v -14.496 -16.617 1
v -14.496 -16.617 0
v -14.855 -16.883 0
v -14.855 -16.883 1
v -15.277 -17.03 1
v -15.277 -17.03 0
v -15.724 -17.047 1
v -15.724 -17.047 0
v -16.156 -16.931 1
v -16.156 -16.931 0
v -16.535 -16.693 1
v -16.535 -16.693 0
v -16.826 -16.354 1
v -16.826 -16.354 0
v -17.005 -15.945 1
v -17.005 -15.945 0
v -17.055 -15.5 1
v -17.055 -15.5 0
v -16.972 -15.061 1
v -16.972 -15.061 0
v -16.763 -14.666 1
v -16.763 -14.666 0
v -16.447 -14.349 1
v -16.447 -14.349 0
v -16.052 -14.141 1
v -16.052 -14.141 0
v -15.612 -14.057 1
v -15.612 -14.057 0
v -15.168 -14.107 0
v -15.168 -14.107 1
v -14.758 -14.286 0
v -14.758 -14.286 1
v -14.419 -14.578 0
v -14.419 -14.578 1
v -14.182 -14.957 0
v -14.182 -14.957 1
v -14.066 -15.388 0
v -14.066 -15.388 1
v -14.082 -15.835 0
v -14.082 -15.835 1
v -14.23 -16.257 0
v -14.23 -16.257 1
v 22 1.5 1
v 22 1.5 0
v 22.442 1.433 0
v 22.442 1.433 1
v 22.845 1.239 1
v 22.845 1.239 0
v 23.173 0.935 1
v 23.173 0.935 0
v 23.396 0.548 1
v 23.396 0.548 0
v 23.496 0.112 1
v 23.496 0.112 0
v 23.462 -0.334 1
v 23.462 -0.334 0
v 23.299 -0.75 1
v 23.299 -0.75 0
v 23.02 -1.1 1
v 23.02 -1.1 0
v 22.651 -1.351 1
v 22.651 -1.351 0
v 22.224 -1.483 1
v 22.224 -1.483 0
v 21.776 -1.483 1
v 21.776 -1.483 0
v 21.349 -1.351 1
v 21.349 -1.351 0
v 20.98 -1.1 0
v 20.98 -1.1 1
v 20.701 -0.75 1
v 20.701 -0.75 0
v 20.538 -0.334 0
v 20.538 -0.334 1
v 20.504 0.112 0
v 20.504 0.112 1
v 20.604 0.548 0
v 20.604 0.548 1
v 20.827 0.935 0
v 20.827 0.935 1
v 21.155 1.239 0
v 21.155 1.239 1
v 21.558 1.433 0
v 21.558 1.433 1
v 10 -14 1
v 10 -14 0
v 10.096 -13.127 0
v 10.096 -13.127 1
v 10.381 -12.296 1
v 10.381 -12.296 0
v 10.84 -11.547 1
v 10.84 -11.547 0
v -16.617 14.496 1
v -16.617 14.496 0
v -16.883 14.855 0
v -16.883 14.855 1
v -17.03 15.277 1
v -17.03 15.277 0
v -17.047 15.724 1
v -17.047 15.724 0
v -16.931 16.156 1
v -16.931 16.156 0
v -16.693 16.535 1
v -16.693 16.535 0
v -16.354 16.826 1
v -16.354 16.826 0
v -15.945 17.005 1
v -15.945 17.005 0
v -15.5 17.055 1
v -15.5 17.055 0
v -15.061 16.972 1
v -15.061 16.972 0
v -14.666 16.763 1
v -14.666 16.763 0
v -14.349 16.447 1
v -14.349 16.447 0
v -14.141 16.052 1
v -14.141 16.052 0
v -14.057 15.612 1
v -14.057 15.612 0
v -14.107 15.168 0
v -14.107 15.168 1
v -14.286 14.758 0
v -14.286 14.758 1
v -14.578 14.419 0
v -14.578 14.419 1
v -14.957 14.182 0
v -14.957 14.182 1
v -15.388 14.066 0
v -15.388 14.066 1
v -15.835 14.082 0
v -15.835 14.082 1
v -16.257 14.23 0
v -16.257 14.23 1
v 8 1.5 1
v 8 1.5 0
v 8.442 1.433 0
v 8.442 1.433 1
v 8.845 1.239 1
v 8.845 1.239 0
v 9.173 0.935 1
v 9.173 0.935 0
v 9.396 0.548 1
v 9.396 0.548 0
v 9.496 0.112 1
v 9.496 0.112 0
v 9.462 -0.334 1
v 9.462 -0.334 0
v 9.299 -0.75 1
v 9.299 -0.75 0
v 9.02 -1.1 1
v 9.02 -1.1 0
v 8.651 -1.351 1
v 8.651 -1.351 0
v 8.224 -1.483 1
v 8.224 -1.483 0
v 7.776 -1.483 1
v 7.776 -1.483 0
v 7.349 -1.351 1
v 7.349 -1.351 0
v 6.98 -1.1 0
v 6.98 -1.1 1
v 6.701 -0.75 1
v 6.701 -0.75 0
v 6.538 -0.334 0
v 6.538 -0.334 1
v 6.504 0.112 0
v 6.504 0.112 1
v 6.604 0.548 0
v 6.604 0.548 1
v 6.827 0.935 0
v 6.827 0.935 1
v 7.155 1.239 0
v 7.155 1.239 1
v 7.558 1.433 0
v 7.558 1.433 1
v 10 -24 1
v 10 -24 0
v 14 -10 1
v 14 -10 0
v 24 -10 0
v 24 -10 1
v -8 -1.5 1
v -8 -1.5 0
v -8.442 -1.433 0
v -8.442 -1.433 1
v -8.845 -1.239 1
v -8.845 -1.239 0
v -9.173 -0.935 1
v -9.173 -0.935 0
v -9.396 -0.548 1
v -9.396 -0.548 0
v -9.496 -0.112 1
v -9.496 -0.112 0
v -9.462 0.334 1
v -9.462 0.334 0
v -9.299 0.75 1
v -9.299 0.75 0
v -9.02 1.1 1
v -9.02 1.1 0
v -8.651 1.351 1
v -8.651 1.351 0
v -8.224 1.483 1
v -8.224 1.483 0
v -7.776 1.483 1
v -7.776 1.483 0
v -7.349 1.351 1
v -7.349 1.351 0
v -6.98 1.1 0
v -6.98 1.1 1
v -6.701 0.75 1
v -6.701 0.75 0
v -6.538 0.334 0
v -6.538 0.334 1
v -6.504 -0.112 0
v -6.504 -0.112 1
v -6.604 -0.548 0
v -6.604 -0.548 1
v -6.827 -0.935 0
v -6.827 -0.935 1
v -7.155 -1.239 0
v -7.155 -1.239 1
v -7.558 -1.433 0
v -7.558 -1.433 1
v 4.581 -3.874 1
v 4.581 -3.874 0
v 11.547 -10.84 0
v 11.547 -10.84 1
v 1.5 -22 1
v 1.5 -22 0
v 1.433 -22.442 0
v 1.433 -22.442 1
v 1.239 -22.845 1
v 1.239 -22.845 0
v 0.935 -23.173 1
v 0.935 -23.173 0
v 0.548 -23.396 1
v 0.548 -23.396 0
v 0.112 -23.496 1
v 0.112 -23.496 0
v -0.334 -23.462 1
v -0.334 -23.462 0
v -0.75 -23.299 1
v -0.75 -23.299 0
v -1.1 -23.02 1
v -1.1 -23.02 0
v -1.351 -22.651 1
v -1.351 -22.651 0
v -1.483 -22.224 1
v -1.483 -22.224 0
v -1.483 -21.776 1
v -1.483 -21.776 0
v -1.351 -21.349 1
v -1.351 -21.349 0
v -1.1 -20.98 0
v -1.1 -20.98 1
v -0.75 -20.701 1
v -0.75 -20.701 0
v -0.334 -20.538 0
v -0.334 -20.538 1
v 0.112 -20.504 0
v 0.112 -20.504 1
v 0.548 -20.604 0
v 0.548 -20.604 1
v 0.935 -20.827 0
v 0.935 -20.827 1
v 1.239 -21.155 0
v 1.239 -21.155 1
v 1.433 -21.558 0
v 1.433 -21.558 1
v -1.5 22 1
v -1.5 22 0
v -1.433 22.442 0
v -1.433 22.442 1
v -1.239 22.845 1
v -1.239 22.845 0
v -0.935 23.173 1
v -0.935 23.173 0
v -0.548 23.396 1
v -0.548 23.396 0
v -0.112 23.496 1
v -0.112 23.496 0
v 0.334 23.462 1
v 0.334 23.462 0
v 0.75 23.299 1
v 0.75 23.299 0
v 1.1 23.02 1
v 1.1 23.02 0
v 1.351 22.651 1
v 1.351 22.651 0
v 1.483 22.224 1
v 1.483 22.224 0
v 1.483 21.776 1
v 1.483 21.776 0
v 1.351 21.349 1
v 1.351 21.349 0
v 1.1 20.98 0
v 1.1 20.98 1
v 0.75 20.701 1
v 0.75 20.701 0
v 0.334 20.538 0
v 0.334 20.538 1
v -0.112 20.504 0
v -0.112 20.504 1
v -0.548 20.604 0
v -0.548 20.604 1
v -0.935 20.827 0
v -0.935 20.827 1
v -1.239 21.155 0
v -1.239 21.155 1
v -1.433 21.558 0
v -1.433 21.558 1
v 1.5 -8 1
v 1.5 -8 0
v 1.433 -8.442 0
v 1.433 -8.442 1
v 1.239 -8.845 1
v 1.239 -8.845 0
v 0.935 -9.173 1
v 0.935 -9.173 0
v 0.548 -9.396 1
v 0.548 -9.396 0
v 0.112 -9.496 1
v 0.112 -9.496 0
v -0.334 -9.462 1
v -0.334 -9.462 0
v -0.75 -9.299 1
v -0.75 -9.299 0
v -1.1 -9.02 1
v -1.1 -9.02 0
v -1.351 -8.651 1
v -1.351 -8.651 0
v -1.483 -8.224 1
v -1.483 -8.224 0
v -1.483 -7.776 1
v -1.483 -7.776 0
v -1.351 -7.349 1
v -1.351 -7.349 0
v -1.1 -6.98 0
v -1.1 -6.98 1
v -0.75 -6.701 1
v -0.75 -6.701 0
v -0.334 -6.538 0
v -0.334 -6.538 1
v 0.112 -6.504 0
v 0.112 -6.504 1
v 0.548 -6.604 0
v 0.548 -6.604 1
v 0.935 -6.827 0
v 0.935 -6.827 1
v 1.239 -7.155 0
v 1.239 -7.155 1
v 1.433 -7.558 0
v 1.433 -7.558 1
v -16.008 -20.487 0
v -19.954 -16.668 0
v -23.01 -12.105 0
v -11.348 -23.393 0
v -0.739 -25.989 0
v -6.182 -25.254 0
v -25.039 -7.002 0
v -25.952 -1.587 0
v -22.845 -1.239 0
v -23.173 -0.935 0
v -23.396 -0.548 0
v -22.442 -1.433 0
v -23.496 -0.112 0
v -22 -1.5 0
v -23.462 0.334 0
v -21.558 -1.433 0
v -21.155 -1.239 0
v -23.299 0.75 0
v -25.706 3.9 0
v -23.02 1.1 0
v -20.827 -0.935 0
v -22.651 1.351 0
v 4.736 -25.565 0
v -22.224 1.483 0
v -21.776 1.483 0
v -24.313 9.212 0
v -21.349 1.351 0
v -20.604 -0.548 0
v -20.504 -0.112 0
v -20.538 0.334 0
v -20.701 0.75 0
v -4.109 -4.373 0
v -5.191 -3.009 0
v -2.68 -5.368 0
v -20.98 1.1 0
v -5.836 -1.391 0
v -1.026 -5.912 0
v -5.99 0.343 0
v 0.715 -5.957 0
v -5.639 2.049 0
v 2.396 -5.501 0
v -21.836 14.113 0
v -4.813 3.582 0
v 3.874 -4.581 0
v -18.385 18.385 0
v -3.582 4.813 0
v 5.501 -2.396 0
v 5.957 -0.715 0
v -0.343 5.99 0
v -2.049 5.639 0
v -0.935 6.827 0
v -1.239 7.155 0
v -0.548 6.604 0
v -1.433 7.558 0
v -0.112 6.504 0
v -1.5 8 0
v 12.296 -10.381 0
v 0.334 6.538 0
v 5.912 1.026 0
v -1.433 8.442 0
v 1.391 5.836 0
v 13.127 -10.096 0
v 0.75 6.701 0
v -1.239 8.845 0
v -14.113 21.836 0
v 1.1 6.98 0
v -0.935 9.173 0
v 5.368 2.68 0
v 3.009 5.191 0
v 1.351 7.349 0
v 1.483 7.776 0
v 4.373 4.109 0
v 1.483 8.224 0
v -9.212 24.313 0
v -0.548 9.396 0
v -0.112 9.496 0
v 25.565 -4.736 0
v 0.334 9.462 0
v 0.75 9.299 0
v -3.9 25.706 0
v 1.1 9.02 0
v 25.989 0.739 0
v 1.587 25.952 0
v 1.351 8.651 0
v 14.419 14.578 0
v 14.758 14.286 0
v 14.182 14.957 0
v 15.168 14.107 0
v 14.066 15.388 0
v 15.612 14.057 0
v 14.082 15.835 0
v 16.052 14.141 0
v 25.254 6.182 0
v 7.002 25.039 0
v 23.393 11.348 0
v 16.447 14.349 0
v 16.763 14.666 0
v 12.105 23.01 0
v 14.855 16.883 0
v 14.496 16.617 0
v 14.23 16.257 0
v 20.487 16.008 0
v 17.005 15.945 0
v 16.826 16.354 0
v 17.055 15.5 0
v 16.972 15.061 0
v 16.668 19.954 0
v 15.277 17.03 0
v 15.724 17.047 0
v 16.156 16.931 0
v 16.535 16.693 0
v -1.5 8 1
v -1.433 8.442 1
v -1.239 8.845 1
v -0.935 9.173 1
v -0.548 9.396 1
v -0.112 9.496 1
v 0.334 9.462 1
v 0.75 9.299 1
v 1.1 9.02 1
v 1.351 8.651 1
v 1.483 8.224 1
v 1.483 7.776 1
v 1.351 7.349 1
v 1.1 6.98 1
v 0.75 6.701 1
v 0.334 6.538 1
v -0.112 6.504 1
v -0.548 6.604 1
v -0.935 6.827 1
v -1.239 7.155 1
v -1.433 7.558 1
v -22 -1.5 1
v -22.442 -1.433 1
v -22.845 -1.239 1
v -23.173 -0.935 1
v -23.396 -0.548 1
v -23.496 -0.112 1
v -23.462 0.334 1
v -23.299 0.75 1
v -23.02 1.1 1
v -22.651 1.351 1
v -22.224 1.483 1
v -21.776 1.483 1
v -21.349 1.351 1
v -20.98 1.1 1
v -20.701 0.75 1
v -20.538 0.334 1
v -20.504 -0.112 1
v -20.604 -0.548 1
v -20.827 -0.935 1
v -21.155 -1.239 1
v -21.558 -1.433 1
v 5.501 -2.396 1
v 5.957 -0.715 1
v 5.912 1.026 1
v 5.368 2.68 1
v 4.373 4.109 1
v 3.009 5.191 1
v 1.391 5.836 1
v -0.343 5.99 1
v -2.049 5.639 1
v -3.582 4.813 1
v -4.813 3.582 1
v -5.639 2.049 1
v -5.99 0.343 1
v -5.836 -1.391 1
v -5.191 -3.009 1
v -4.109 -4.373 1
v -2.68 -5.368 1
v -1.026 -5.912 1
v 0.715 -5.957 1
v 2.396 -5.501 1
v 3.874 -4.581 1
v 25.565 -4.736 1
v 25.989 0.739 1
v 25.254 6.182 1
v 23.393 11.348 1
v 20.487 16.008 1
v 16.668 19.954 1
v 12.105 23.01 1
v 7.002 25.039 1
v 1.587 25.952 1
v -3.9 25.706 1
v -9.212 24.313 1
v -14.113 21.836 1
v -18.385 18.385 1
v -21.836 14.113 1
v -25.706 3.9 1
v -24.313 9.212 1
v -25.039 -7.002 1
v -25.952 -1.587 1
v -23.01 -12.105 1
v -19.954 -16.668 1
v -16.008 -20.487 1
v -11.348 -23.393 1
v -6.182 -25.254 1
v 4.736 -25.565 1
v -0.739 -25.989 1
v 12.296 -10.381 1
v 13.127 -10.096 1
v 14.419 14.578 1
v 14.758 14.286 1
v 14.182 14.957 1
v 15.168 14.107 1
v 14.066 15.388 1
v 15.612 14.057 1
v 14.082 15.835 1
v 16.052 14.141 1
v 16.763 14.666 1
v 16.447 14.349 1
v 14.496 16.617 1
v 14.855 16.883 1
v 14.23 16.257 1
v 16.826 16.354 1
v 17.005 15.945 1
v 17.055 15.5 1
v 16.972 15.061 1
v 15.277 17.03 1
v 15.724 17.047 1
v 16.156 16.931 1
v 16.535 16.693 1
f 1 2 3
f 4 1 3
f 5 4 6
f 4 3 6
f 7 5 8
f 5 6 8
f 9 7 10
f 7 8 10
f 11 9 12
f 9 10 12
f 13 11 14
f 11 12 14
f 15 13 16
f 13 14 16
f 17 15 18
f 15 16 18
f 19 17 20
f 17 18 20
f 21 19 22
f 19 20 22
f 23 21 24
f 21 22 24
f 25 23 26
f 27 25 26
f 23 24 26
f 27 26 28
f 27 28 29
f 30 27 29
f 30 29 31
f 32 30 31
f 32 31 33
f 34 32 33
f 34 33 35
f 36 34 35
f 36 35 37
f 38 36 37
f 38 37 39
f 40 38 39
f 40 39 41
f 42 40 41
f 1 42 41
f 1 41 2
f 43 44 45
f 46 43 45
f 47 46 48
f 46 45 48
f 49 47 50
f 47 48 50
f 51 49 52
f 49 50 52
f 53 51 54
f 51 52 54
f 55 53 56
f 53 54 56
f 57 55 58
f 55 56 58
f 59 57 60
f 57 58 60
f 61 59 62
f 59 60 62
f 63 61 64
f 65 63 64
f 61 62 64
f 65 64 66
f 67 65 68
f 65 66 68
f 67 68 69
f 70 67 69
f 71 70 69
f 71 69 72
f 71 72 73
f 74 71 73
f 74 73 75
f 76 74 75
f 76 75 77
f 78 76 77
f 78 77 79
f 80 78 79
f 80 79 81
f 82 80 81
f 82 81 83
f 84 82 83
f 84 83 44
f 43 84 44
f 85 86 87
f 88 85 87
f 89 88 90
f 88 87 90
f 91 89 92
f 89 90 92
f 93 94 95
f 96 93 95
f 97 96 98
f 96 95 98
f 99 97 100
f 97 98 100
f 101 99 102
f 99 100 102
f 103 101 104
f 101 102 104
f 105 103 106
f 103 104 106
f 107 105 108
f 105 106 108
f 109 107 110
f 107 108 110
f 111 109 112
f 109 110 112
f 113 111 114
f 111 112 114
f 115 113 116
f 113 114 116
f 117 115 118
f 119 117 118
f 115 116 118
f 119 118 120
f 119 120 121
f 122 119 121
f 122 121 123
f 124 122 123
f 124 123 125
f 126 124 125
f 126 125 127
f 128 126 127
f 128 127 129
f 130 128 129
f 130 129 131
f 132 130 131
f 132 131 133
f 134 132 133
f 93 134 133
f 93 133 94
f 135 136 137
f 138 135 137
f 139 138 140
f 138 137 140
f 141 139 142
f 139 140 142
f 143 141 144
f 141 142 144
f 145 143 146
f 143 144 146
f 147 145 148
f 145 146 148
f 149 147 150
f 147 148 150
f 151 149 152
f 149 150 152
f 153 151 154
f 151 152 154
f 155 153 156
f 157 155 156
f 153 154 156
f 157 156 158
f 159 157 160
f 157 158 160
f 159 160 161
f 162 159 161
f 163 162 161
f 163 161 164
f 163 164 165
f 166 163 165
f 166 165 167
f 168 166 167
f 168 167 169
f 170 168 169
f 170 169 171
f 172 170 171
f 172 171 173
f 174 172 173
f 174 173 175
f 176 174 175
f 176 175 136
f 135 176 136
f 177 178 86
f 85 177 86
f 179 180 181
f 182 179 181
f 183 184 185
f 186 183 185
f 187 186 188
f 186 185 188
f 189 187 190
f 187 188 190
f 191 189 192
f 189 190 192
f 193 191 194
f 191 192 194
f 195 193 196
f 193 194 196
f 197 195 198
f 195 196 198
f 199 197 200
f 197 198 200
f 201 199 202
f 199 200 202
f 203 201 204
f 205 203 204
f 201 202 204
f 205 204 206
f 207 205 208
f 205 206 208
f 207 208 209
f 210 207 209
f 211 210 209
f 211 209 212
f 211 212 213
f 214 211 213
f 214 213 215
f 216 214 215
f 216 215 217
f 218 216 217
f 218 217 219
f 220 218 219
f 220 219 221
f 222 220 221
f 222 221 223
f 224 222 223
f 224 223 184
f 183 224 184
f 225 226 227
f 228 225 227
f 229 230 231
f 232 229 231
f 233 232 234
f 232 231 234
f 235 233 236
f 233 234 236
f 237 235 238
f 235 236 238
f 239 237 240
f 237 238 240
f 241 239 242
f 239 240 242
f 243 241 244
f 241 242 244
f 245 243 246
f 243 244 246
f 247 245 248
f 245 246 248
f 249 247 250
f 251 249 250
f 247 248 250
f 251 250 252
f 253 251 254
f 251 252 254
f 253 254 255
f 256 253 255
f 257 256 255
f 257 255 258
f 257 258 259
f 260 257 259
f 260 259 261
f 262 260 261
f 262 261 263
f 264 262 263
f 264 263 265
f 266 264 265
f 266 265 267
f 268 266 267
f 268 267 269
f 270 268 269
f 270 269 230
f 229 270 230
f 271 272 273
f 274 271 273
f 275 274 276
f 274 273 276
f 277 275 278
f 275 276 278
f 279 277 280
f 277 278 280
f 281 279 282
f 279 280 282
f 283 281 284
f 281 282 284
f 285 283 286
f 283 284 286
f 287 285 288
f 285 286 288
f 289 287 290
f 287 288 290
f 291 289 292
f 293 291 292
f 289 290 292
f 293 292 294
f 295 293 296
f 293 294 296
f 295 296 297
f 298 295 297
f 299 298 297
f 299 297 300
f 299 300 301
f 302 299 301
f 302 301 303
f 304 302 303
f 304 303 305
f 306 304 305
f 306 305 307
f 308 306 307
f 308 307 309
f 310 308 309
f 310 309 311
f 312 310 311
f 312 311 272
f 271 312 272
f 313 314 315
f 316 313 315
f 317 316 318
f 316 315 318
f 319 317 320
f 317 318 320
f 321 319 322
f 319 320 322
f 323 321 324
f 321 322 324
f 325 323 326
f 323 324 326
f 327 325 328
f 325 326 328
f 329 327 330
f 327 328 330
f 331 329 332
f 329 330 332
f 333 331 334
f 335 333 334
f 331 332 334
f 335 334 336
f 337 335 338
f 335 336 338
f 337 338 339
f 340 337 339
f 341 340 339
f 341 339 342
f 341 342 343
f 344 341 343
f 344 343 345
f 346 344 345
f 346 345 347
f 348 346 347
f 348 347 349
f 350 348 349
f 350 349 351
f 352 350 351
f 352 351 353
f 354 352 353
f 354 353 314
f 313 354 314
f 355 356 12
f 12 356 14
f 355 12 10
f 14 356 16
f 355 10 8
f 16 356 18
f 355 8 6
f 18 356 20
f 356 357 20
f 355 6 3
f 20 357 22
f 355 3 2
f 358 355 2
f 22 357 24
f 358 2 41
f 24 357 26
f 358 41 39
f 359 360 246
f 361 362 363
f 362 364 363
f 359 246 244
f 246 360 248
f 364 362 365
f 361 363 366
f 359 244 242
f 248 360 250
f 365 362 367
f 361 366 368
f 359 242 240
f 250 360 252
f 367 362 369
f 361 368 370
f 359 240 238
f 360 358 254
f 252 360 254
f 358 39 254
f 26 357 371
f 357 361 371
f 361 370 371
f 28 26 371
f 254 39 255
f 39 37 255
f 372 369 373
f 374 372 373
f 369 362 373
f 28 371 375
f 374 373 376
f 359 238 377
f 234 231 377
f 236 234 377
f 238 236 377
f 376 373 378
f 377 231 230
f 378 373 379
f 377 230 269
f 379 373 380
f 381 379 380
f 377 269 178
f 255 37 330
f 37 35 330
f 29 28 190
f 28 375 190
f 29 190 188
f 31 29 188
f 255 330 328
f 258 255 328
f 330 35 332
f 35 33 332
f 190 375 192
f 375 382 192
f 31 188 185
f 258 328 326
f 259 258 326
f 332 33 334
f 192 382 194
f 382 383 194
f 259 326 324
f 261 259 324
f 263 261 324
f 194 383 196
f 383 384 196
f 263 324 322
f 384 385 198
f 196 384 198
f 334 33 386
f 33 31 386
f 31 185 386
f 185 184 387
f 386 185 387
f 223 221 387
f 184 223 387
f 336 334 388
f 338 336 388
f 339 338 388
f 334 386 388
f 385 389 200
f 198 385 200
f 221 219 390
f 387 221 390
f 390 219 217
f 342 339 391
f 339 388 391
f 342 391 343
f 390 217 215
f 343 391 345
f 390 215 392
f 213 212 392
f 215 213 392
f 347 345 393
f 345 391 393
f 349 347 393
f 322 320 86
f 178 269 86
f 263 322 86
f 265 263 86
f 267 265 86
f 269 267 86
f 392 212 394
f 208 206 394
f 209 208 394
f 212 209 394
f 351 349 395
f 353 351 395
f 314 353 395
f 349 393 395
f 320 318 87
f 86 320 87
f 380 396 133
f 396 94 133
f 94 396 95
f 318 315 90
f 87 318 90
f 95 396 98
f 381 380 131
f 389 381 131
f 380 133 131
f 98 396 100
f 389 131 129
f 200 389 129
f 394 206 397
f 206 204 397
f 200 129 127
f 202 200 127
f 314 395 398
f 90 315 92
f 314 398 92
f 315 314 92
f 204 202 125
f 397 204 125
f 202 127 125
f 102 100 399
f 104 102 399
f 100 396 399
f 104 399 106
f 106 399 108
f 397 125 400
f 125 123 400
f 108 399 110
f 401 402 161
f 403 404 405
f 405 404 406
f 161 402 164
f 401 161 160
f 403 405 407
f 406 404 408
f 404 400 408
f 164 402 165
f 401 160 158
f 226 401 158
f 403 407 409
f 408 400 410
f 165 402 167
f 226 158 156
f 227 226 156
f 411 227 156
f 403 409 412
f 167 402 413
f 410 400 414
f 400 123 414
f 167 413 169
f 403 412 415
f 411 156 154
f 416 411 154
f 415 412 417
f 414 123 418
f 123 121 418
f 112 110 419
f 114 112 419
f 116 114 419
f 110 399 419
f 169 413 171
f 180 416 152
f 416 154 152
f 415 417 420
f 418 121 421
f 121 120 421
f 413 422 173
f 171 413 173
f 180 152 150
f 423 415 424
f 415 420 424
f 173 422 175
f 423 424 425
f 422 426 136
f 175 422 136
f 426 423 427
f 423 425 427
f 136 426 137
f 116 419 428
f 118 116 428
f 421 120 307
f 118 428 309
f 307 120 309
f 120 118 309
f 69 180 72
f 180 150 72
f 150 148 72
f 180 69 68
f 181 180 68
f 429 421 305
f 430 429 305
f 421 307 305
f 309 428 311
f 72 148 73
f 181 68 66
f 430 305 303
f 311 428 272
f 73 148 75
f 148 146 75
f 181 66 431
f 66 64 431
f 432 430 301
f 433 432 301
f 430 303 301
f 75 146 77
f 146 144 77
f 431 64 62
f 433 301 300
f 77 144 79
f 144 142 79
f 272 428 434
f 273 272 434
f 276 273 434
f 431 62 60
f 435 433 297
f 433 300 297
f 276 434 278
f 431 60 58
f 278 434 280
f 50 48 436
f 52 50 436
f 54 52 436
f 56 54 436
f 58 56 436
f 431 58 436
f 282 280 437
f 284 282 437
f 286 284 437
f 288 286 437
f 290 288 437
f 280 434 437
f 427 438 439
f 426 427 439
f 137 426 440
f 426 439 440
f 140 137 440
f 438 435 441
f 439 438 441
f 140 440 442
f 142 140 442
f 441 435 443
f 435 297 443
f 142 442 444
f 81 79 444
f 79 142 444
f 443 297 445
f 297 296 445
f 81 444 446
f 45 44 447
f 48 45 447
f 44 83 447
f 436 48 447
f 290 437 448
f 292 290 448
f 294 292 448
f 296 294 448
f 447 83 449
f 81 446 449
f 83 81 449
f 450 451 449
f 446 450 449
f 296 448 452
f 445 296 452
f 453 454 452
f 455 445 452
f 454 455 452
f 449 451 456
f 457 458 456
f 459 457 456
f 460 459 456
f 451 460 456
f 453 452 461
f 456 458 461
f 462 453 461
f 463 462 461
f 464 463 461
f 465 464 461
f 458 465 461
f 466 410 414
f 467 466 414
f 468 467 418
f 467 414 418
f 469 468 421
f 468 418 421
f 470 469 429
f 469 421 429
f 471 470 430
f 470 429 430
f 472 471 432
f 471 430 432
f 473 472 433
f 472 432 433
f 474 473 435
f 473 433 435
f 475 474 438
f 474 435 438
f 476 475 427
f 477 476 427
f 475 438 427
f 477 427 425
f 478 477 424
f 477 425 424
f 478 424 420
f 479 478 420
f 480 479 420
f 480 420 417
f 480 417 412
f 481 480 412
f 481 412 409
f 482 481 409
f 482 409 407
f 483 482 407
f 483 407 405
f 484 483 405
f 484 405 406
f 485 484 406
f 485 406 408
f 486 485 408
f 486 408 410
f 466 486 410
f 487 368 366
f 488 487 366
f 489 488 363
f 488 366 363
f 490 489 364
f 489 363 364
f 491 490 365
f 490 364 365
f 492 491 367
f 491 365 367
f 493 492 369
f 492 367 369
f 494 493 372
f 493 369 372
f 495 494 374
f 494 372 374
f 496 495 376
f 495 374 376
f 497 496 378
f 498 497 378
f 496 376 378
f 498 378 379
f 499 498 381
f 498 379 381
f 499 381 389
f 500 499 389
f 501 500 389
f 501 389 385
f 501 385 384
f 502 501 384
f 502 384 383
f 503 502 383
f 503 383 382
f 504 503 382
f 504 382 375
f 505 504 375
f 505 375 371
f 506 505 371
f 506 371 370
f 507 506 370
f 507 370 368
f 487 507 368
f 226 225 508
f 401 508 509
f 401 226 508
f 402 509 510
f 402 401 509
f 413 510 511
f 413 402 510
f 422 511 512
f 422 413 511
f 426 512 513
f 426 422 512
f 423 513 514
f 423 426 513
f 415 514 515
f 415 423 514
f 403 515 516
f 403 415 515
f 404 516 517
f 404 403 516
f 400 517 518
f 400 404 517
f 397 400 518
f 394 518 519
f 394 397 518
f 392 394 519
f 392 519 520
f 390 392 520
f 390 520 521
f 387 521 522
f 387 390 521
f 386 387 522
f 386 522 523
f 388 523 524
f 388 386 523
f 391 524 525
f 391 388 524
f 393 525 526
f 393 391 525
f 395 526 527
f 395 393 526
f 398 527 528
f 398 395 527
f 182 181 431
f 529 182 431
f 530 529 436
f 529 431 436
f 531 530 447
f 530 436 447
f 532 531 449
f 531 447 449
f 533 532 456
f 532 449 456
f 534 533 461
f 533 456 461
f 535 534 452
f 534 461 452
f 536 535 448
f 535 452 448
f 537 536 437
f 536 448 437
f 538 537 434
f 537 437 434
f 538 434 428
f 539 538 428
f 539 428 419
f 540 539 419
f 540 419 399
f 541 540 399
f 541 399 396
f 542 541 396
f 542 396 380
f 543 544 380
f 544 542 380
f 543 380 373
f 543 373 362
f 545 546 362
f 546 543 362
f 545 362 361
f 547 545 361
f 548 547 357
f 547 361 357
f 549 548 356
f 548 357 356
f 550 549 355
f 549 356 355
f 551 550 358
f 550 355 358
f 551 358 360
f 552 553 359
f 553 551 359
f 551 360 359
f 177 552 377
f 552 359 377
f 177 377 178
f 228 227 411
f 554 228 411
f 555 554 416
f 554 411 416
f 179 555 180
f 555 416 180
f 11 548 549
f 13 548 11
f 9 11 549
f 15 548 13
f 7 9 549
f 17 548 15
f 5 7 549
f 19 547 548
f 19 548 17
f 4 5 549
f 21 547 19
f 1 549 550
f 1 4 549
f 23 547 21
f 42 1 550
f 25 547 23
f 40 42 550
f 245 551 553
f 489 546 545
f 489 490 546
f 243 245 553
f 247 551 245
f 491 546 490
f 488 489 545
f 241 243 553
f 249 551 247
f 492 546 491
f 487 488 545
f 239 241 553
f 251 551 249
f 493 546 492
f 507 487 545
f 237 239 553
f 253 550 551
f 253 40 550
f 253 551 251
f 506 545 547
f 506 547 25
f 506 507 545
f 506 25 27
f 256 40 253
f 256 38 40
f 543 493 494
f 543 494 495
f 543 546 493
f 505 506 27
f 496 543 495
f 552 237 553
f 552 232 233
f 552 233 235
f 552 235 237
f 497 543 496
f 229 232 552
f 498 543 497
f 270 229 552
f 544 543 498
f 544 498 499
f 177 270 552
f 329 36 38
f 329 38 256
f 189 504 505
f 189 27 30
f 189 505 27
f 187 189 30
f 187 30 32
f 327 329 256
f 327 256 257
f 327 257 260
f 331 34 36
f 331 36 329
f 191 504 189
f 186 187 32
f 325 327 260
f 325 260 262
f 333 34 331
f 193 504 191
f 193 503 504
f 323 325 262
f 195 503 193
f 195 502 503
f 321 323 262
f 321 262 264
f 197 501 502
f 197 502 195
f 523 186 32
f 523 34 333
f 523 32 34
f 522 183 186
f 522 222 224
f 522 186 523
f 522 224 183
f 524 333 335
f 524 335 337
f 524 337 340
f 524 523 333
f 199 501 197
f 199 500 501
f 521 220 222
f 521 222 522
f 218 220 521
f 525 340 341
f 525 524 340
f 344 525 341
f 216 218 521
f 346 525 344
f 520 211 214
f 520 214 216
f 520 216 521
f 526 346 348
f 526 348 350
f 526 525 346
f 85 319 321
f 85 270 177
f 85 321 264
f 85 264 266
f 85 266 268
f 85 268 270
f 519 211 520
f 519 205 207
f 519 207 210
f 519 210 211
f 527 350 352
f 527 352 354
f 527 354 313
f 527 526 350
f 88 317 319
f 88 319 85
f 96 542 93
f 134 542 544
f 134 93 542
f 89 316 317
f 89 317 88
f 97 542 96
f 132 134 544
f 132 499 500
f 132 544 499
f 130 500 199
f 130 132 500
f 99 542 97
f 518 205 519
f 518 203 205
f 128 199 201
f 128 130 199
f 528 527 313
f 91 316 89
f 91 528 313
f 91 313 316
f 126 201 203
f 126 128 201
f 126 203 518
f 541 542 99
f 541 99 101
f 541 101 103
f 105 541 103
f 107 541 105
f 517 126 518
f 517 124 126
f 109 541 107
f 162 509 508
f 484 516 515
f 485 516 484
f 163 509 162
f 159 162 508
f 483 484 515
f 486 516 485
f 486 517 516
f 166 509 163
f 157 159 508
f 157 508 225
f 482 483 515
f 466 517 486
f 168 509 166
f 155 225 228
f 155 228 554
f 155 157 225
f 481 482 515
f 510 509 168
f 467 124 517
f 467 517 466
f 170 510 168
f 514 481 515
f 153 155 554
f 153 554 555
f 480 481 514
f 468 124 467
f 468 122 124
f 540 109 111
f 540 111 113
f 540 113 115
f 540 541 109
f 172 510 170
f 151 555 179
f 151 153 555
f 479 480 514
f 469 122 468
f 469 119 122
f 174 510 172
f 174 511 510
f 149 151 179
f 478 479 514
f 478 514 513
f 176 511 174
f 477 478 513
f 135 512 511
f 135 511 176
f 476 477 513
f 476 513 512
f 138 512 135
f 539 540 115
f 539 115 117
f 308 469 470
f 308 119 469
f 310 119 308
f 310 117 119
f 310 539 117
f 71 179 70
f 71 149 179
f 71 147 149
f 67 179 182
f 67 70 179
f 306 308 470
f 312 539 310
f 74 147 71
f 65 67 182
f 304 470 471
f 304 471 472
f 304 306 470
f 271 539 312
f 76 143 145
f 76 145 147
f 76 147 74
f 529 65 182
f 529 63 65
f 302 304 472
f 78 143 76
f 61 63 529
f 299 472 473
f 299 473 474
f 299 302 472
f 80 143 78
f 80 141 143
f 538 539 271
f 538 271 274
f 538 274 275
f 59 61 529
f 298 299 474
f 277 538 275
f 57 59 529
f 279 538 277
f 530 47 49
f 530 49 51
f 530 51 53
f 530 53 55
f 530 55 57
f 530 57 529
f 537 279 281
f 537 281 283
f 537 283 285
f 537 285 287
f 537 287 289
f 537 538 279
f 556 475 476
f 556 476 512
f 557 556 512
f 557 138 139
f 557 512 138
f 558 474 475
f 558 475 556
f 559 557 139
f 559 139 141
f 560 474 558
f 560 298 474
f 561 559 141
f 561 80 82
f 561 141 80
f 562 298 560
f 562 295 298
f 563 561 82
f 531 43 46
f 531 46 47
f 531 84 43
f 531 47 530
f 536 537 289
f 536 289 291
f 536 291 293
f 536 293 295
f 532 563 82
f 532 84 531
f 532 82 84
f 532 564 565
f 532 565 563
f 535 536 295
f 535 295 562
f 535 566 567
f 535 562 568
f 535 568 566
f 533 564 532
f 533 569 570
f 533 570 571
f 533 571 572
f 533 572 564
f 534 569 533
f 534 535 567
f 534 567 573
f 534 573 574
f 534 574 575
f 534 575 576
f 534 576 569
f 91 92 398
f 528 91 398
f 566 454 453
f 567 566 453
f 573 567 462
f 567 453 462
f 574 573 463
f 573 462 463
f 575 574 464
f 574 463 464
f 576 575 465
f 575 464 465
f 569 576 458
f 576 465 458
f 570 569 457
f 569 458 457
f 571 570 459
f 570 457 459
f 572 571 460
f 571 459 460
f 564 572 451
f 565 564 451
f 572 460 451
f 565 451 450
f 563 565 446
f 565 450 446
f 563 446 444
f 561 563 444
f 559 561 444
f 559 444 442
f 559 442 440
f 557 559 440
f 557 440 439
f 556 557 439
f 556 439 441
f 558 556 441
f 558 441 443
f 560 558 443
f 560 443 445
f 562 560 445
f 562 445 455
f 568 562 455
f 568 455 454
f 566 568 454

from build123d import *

# Parameters (mm, degrees)
SKETCH_R              = 26
SKETCH_R_2            = 6
PAD_DEPTH             = 1
SKETCH001_R           = 1.5
POCKET_DEPTH          = 148.092808
POLARPATTERN_COUNT    = 4
SKETCH002_R           = 1.5
POCKET001_DEPTH       = 148.092808
POLARPATTERN001_COUNT = 7
POLARPATTERN001_ANGLE = 270
POCKET002_DEPTH       = 1.001


with BuildPart() as part:
    # Sketch → Pad (new body)
    with BuildSketch(Plane.XY):
        Circle(SKETCH_R)
        Circle(SKETCH_R_2, mode=Mode.SUBTRACT)
    extrude(amount=PAD_DEPTH)

    # Sketch001 (on Face3 of Pad) → Pocket (cut, through all)
    with BuildSketch(Plane(origin=(0, 0, 0), x_dir=(1, 0, 0), z_dir=(0, 0, -1))):
        with Locations((0, 8)):
            Circle(SKETCH001_R)
    pocket = extrude(amount=-POCKET_DEPTH, mode=Mode.SUBTRACT)

    # PolarPattern: Pocket ×4 about axis
    polarpattern_axis = Axis((0, 0, 0), (0, 0, -1))
    for i in range(1, POLARPATTERN_COUNT):
        add(pocket.rotate(polarpattern_axis, i * 360 / POLARPATTERN_COUNT), mode=Mode.SUBTRACT)

    # Sketch002 (on Face2 of PolarPattern) → Pocket001 (cut, through all)
    with BuildSketch(Plane(origin=(0, 0, 0), x_dir=(1, 0, 0), z_dir=(0, 0, -1))):
        with Locations((0, 22)):
            Circle(SKETCH002_R)
    pocket001 = extrude(amount=-POCKET001_DEPTH, mode=Mode.SUBTRACT)

    # PolarPattern001: Pocket001 ×7 about axis
    polarpattern001_axis = Axis((0, 0, 0), (0, 0, -1))
    for i in range(1, POLARPATTERN001_COUNT):
        add(pocket001.rotate(polarpattern001_axis, i * POLARPATTERN001_ANGLE / (POLARPATTERN001_COUNT - 1)), mode=Mode.SUBTRACT)

    # Sketch003 (on Face2 of PolarPattern001) → Pocket002 (cut, through all)
    with BuildSketch(Plane(origin=(0, 0, 0), x_dir=(1, 0, 0), z_dir=(0, 0, -1))):
        with BuildLine():
            Line((10, 28.284271), (10, 14))
            ThreePointArc((10, 14), (10.215876, 12.703695), (10.840204, 11.54731))
            Line((10.840204, 11.54731), (-0.353553, 0.353553))
            Line((-0.353553, 0.353553), (0.353553, -0.353553))
            Line((0.353553, -0.353553), (11.54731, 10.840204))
            ThreePointArc((11.54731, 10.840204), (12.703695, 10.215876), (14, 10))
            Line((14, 10), (28.284271, 10))
            ThreePointArc((28.284271, 10), (21.213203, 21.213203), (10, 28.284271))
        make_face()
    extrude(amount=-POCKET002_DEPTH, mode=Mode.SUBTRACT)


solid = part.part
